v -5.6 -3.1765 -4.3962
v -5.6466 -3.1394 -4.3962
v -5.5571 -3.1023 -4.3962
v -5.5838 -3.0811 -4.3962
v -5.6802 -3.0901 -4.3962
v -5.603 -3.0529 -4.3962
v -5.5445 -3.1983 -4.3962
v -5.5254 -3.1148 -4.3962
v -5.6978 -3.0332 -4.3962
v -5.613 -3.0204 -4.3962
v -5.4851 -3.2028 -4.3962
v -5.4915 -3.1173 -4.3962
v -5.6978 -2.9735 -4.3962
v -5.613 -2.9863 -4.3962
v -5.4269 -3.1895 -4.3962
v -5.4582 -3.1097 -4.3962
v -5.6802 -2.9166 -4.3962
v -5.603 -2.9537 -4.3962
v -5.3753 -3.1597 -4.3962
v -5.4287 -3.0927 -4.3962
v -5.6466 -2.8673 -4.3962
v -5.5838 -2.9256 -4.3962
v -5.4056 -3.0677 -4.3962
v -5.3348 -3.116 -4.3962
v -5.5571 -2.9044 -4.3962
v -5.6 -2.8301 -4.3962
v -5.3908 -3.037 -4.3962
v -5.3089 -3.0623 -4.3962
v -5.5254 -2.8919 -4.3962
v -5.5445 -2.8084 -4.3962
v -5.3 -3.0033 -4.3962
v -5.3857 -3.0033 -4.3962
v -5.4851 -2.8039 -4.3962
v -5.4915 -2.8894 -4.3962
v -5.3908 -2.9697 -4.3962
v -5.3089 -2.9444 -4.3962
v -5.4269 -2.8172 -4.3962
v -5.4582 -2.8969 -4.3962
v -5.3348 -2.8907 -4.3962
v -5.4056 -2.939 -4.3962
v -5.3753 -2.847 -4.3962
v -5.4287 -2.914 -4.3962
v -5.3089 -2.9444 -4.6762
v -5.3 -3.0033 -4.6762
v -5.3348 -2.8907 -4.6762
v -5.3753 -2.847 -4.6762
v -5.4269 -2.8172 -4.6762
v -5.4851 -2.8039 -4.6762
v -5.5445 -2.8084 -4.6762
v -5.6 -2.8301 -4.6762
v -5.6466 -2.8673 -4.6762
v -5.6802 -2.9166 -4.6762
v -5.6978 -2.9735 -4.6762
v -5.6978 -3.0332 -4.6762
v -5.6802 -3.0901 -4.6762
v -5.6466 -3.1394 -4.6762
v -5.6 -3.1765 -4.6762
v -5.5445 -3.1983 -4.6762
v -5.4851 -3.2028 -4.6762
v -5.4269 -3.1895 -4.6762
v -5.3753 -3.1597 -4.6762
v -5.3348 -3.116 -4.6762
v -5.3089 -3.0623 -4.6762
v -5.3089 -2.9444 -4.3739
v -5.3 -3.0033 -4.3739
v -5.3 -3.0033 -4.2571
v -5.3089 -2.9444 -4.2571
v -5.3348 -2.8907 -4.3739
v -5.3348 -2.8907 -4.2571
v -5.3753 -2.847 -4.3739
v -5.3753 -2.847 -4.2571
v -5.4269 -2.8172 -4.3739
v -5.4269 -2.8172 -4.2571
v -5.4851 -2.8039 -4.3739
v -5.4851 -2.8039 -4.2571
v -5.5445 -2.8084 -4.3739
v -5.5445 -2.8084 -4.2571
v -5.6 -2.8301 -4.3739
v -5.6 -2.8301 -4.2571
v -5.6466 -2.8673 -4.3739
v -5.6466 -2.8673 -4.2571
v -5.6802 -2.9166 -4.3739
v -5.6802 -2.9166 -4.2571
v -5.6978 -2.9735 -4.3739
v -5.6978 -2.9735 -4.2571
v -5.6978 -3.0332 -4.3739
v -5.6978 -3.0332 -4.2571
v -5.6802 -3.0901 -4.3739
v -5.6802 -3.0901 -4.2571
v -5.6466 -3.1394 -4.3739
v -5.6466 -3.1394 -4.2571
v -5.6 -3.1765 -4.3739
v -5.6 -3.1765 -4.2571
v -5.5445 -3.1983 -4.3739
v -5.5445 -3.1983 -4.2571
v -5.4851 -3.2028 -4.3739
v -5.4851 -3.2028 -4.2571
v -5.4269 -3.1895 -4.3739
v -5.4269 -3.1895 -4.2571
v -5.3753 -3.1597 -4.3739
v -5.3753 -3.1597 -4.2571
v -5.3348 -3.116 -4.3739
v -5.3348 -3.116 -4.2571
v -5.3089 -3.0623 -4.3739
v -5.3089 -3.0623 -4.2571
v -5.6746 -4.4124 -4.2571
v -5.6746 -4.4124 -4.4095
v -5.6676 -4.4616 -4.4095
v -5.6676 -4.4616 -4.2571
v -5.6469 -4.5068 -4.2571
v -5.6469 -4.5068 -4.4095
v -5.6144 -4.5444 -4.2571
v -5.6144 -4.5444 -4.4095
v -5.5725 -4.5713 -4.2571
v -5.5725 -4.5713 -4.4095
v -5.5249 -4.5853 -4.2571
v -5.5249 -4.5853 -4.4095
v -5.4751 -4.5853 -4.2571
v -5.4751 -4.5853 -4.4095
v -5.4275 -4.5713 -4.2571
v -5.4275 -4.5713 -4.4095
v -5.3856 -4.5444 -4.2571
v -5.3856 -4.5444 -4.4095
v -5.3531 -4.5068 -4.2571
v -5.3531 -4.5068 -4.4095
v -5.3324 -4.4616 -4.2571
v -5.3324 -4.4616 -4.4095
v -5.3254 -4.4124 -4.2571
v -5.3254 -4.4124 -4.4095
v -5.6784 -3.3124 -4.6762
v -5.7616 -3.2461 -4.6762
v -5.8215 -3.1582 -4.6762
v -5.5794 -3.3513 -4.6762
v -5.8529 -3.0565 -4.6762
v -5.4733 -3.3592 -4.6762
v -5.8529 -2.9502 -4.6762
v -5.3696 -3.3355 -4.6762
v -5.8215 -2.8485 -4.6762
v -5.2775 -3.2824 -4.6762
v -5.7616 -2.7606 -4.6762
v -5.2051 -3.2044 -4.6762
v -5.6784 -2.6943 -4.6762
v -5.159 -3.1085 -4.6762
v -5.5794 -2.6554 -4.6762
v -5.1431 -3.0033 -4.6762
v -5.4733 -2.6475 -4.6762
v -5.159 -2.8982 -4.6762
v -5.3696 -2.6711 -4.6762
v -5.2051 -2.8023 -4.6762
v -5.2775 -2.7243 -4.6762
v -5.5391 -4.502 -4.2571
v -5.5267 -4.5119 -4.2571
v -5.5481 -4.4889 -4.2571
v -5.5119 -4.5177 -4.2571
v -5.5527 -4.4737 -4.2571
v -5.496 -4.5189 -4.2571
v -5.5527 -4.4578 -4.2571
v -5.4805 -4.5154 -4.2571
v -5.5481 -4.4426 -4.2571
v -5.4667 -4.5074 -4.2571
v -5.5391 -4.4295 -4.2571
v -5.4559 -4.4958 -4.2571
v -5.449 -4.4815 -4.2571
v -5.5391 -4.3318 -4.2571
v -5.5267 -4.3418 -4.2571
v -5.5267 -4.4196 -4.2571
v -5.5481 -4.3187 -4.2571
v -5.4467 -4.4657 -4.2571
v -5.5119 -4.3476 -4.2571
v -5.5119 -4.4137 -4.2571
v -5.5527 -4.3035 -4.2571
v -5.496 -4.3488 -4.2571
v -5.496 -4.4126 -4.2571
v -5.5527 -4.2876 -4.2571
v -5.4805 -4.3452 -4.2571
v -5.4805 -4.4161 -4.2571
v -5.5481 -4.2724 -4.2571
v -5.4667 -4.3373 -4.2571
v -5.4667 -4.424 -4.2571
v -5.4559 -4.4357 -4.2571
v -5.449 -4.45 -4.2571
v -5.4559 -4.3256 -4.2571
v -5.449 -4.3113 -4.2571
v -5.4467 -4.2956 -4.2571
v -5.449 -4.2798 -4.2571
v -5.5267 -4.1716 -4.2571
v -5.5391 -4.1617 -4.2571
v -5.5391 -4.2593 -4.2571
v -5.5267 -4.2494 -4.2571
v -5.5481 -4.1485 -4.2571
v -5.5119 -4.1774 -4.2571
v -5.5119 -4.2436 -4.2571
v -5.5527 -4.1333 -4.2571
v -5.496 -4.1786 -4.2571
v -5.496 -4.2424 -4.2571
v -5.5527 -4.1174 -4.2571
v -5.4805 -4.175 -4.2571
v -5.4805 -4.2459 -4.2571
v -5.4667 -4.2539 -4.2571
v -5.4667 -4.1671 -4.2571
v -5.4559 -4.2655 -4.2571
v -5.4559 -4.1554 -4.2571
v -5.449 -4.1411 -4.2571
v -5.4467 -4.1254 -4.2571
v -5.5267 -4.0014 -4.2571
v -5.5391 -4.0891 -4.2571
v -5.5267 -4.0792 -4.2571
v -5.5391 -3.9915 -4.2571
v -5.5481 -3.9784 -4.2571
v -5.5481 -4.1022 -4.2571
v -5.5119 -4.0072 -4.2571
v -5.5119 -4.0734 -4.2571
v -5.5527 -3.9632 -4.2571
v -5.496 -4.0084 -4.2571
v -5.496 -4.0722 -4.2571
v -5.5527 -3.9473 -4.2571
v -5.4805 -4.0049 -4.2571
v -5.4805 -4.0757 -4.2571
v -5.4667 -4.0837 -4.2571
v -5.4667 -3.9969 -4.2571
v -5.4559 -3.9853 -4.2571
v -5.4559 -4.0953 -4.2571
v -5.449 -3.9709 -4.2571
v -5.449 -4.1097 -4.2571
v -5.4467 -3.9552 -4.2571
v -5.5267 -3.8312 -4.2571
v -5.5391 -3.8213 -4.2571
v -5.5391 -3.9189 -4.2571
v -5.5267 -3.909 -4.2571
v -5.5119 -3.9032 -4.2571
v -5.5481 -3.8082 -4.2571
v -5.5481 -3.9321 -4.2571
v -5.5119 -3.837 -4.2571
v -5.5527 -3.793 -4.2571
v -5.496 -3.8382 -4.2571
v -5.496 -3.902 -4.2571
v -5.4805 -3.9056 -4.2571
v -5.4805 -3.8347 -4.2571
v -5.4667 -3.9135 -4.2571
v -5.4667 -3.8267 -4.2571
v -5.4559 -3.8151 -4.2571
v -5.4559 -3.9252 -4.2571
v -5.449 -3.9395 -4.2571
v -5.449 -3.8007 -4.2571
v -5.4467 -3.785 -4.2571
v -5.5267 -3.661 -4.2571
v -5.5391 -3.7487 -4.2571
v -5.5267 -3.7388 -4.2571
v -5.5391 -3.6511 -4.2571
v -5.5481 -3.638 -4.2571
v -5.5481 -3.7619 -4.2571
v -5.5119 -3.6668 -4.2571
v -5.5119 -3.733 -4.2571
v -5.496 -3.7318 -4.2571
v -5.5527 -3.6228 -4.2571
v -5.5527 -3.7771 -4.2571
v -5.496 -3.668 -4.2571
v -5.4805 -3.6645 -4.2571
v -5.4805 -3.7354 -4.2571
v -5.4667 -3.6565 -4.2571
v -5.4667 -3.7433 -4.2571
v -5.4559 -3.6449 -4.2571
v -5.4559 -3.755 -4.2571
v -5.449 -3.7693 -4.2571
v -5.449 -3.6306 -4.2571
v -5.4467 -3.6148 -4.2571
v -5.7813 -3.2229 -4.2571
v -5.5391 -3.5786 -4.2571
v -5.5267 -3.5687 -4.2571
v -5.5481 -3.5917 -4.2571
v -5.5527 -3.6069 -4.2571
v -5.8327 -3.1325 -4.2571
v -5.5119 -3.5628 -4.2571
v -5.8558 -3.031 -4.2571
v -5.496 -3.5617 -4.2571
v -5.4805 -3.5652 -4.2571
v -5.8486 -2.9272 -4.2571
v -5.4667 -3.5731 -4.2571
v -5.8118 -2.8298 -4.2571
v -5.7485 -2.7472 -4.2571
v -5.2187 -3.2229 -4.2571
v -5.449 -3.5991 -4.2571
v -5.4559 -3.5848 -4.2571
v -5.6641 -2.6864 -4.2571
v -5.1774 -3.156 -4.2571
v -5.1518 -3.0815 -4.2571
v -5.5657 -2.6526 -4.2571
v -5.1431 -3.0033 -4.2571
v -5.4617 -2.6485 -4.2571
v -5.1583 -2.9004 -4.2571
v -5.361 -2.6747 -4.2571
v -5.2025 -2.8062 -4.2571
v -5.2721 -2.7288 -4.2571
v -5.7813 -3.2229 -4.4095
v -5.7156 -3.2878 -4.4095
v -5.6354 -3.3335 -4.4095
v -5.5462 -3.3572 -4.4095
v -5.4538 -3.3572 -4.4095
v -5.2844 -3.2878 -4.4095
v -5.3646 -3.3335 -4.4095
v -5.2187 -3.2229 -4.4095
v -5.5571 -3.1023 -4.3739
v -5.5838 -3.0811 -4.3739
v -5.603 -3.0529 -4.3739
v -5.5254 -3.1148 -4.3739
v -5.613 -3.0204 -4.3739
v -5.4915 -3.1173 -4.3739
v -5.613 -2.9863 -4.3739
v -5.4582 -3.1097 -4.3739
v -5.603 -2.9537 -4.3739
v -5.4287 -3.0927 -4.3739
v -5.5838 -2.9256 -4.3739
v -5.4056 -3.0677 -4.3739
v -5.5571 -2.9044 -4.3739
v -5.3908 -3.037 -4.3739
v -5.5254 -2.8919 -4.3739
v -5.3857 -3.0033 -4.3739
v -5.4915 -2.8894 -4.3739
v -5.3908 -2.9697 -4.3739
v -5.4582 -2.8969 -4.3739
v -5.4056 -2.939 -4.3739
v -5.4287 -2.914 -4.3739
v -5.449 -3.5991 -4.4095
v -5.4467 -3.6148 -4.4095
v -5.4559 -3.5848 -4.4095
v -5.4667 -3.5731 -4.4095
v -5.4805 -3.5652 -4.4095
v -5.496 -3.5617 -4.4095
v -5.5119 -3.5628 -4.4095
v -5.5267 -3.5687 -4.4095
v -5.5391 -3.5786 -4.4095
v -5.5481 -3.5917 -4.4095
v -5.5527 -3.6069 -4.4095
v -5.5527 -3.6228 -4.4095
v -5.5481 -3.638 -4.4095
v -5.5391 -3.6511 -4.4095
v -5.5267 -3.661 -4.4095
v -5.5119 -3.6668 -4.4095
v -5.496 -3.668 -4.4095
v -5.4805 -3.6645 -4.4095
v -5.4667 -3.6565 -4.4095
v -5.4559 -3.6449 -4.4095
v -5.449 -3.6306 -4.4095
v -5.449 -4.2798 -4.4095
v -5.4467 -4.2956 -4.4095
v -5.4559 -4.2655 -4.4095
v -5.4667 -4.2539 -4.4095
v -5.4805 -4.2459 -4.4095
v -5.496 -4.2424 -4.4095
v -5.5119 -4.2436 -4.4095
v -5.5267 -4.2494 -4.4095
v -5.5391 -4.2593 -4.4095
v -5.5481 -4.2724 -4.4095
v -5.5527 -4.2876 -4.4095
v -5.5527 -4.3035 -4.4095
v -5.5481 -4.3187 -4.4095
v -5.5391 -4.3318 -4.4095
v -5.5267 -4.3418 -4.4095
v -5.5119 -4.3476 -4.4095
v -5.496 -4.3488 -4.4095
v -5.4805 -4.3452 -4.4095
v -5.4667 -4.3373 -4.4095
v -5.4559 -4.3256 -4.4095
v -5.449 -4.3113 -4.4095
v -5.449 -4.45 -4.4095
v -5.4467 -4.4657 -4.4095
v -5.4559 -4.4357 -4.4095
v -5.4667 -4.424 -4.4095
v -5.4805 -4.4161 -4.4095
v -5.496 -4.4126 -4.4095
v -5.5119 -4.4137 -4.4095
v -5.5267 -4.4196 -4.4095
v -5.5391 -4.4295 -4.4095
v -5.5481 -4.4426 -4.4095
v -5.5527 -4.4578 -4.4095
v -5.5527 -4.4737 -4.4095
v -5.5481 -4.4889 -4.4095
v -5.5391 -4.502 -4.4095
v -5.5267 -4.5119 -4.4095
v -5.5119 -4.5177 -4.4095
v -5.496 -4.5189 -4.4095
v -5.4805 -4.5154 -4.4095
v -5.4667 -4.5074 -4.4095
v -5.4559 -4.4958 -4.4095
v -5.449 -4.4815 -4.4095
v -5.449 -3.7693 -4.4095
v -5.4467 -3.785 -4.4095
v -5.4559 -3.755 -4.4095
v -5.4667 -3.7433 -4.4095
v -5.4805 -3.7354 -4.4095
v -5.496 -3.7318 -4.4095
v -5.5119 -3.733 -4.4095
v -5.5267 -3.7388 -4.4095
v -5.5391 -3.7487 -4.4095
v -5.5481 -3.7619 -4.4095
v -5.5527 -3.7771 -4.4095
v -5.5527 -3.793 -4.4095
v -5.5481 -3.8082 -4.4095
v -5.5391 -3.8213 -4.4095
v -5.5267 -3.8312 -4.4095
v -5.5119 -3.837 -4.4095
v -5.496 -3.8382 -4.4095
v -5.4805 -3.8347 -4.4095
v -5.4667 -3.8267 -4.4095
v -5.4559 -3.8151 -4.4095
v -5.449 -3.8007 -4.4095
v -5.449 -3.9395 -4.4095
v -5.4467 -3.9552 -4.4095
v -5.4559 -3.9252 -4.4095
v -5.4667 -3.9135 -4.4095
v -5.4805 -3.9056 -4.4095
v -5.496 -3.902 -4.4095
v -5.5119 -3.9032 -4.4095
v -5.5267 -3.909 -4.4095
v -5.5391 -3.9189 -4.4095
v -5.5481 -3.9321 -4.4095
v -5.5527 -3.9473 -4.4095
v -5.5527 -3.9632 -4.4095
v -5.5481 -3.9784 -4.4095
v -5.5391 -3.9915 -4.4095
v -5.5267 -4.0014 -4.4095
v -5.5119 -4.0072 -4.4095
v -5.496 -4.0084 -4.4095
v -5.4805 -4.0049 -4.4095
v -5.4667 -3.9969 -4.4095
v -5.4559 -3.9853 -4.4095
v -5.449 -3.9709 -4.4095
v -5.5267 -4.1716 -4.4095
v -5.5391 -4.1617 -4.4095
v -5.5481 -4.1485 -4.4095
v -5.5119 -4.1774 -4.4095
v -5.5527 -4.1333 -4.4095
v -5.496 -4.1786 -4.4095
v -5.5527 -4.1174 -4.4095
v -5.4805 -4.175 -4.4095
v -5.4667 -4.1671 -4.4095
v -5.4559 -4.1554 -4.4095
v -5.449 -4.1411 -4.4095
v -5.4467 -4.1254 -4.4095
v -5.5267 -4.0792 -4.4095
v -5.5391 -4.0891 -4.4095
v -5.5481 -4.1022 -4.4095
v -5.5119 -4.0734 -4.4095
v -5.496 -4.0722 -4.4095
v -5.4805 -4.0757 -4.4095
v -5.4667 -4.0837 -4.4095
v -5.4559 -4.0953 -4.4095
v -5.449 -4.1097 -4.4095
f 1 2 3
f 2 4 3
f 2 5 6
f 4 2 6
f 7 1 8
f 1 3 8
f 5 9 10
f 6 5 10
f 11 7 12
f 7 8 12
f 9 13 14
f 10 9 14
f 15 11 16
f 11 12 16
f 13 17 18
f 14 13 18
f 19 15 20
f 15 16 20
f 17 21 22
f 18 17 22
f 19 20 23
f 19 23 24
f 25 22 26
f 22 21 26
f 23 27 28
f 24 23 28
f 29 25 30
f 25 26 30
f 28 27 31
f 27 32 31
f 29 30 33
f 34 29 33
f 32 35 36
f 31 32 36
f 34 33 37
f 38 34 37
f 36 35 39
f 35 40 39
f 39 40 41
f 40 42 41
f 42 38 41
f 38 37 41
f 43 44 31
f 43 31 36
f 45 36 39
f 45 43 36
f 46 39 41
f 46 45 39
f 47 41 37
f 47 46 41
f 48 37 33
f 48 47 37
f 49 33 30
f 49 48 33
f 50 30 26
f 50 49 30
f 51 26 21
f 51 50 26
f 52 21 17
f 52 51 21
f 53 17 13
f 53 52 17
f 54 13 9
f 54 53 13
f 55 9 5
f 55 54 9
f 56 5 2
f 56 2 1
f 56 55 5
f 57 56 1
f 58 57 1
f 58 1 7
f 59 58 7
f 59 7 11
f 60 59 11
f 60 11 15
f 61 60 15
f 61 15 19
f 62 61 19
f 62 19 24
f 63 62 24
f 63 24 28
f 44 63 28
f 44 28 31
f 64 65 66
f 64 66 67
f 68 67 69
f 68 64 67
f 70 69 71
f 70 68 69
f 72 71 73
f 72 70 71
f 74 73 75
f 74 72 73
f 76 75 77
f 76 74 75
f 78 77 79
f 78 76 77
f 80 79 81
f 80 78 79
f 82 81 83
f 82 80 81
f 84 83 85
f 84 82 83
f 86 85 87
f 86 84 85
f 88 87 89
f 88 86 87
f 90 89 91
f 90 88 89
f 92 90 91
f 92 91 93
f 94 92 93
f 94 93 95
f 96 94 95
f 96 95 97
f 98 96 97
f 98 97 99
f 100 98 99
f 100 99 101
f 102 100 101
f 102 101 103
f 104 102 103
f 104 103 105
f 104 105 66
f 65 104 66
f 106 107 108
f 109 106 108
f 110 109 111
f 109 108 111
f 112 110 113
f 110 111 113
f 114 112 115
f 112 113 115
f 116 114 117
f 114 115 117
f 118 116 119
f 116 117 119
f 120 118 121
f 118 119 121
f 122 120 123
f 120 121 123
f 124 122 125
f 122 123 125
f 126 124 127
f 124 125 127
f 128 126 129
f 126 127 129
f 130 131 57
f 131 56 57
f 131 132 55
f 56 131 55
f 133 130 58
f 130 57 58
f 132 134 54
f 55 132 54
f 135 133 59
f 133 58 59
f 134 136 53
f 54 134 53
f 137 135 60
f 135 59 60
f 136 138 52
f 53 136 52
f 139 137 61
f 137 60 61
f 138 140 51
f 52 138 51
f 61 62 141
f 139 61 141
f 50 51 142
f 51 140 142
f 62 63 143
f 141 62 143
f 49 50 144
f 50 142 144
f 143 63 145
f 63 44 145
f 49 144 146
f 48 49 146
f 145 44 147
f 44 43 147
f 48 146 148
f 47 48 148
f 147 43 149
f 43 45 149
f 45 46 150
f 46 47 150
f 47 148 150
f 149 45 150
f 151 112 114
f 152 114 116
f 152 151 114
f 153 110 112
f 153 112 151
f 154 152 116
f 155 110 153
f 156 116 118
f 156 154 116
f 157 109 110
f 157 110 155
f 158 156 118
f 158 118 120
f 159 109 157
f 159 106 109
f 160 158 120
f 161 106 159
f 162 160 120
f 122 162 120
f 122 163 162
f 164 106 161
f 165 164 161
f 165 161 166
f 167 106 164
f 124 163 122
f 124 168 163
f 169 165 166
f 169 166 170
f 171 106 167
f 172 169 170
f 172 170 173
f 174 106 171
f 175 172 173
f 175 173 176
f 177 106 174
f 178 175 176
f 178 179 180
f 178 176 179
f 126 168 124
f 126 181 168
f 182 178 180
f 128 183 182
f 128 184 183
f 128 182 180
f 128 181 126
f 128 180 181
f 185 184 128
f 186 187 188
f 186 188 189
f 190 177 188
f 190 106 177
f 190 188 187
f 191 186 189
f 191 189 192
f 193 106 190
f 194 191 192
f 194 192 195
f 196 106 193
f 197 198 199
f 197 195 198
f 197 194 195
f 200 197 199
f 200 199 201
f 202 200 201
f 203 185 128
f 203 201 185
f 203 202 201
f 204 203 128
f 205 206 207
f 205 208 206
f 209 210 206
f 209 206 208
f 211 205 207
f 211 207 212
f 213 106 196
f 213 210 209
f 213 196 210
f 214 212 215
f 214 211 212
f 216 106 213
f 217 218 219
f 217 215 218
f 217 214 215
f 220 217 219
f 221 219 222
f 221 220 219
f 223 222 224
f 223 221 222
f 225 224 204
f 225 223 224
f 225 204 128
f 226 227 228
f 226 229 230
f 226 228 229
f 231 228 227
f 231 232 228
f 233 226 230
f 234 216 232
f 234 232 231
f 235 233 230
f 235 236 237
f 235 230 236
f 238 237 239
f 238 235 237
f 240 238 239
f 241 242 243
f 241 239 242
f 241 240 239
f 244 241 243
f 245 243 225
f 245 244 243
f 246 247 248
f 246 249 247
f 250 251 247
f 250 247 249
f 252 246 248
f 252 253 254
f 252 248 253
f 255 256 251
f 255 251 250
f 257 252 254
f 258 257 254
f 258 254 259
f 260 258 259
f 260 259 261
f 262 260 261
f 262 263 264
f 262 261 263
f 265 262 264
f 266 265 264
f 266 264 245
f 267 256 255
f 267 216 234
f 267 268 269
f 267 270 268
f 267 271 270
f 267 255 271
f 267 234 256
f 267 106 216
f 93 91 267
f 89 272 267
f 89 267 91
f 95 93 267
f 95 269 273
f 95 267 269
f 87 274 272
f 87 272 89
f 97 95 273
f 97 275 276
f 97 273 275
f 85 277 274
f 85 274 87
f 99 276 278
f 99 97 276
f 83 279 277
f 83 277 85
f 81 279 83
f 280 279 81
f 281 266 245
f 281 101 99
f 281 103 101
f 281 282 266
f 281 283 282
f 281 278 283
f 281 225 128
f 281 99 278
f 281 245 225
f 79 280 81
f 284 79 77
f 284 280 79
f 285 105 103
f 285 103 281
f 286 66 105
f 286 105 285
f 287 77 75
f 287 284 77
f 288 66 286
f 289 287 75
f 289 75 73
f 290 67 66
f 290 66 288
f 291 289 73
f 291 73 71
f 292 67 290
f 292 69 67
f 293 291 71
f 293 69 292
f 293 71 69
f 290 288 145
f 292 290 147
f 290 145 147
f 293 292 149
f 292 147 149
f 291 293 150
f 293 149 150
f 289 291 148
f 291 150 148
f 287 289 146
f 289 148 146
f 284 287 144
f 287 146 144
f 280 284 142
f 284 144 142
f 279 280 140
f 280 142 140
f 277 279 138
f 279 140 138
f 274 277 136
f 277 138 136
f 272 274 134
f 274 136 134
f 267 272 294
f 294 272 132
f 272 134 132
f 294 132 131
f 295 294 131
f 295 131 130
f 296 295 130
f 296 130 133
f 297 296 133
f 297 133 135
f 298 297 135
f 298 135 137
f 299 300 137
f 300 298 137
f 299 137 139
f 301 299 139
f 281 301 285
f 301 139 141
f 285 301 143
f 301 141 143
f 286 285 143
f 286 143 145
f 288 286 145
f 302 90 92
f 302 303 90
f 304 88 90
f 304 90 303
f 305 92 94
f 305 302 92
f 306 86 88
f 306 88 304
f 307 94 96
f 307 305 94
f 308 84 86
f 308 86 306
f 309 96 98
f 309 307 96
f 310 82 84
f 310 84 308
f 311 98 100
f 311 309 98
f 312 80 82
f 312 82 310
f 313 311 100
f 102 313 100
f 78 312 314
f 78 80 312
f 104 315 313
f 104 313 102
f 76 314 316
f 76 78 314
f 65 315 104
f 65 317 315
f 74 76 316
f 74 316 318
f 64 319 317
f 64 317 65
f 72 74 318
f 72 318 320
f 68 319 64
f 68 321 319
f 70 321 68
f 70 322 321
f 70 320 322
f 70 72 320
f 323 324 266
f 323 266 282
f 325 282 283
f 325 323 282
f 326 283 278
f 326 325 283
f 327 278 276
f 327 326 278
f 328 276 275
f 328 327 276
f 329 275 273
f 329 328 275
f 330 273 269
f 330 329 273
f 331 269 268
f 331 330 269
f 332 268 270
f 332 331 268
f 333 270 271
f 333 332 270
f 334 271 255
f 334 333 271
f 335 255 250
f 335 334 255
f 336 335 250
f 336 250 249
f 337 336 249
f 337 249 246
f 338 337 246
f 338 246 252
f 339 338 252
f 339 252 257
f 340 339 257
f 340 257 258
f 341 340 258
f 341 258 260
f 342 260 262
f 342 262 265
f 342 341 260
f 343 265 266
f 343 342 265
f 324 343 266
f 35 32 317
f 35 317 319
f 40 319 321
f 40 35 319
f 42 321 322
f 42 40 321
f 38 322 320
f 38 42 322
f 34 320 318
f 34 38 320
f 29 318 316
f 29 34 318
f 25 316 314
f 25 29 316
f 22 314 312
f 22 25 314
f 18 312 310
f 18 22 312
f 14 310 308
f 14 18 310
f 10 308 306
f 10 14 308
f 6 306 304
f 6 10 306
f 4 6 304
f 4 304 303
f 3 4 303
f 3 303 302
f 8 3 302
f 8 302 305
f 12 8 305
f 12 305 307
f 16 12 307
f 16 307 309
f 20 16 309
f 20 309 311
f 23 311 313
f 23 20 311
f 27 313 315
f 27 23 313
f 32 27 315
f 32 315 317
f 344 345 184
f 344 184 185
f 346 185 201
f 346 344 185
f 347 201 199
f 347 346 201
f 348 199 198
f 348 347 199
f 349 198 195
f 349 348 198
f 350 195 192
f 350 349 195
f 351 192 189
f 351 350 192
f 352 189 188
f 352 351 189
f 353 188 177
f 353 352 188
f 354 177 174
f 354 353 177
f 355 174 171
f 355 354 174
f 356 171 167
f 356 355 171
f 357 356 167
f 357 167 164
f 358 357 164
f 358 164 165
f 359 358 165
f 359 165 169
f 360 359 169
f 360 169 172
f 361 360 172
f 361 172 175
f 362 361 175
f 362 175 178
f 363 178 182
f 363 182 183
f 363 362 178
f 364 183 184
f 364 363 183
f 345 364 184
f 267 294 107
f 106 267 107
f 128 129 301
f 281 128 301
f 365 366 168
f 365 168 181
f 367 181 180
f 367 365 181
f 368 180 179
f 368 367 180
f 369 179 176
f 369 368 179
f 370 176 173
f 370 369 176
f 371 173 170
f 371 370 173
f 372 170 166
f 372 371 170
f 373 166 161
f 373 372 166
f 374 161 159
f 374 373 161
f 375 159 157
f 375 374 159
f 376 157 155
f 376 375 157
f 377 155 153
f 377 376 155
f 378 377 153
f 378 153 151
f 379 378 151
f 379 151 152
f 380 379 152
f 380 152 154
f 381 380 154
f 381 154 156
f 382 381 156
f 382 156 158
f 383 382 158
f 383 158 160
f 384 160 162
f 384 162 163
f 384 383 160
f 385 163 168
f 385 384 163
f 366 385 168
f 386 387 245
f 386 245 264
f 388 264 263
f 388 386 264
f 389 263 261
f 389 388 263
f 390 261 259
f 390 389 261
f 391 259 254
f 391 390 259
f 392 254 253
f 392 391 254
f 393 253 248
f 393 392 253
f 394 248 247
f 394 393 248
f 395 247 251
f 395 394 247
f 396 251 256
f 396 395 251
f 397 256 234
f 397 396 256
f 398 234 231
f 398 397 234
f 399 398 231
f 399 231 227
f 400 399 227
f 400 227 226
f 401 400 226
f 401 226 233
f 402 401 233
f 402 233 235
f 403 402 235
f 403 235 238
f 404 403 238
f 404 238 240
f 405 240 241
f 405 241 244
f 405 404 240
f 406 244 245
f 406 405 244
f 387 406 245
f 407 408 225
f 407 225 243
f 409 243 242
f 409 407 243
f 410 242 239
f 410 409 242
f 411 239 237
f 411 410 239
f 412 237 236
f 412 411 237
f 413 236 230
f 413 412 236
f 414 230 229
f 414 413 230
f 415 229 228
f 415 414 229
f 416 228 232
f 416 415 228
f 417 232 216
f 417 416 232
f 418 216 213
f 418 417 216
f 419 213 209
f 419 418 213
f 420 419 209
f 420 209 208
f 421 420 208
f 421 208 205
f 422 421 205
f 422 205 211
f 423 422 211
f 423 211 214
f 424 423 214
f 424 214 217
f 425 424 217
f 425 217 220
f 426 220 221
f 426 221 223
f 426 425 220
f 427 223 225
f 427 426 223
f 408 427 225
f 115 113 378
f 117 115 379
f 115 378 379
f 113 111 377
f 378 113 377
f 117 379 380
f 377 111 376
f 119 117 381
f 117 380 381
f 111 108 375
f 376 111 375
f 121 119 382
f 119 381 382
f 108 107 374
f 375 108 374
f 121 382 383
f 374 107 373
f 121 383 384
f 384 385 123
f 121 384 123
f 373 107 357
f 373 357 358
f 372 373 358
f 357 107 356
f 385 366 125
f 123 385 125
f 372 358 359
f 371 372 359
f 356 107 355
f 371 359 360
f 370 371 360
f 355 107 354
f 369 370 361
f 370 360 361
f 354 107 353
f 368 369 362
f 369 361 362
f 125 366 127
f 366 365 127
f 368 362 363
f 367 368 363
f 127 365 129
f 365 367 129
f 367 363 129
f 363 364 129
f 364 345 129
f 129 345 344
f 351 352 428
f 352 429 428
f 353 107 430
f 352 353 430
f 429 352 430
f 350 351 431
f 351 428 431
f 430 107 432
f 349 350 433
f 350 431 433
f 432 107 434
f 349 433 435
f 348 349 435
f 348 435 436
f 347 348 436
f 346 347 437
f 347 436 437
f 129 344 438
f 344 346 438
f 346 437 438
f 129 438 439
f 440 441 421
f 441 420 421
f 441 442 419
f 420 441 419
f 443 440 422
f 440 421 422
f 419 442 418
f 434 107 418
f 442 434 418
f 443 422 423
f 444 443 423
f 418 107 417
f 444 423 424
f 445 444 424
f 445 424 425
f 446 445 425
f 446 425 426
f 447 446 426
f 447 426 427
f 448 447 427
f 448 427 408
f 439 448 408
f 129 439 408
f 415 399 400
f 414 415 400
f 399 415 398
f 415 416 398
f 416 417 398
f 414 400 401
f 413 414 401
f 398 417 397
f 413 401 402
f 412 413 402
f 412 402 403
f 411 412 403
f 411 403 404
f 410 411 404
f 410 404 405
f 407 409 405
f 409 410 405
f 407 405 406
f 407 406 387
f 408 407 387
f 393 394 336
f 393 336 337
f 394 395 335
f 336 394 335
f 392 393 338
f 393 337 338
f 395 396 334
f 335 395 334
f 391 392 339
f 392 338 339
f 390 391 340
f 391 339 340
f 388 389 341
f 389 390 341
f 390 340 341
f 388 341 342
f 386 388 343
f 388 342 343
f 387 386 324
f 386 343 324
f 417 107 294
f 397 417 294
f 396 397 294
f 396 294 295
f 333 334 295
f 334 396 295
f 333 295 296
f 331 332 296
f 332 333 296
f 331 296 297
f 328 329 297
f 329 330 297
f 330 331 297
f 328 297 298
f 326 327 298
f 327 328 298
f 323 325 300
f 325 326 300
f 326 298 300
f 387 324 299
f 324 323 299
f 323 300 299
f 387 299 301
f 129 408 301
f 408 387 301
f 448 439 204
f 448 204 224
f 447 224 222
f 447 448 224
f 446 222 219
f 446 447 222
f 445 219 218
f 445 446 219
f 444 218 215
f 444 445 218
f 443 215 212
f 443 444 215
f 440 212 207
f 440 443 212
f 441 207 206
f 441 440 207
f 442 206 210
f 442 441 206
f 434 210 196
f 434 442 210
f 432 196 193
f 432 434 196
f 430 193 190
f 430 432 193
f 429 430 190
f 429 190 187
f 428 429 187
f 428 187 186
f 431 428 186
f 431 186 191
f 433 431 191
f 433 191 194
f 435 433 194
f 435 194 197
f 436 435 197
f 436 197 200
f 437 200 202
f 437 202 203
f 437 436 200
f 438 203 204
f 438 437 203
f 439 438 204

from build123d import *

# Parameters (mm, degrees)
SKETCH1_R           = 3.5687
SKETCH1_R_2         = 2
BOSS_EXTRUDE1_DEPTH = 4.191
SKETCH5_R           = 2
SKETCH5_R_2         = 1.143
BOSS_EXTRUDE2_DEPTH = 0.2226
BOSS_EXTRUDE3_START = -1.524
SKETCH6_R           = 0.5334
BOSS_EXTRUDE3_DEPTH = 1.524
SCALE1_SCALE        = 0.1


with BuildPart() as part:
    # Sketch1 → Boss-Extrude1 (new body)
    with BuildSketch(Plane.XY.offset(-7.032965862)):
        with Locations((-5.5, 0)):
            Circle(SKETCH1_R)
        with Locations((-5.5, 0)):
            Circle(SKETCH1_R_2, mode=Mode.SUBTRACT)
    extrude(amount=BOSS_EXTRUDE1_DEPTH)

    # Sketch5 → Boss-Extrude2 (add)
    with BuildSketch(Plane.XY.offset(-4.232965862)):
        with Locations((-5.5, 0)):
            Circle(SKETCH5_R)
        with Locations((-5.5, 0)):
            Circle(SKETCH5_R_2, mode=Mode.SUBTRACT)
    extrude(amount=BOSS_EXTRUDE2_DEPTH)

    # Sketch6 → Boss-Extrude3 (add)
    with BuildSketch(Plane.XY.offset(-2.841965862).offset(BOSS_EXTRUDE3_START)):
        with BuildLine():
            Line((-3.75375, -14.09065), (-2.68695, -2.195989387))
            ThreePointArc((-2.68695, -2.195989387), (-5.5, -3.5687), (-8.31305, -2.195989387))
            Line((-8.31305, -2.195989387), (-7.24625, -14.09065))
            ThreePointArc((-7.24625, -14.09065), (-5.5, -15.8369), (-3.75375, -14.09065))
        make_face()
        with Locations((-5.5, -12.92225)):
            Circle(SKETCH6_R, mode=Mode.SUBTRACT)
        with Locations((-5.5, -14.62405)):
            Circle(SKETCH6_R, mode=Mode.SUBTRACT)
        with Locations((-5.5, -11.22045)):
            Circle(SKETCH6_R, mode=Mode.SUBTRACT)
        with Locations((-5.5, -9.51865)):
            Circle(SKETCH6_R, mode=Mode.SUBTRACT)
        with Locations((-5.5, -7.81685)):
            Circle(SKETCH6_R, mode=Mode.SUBTRACT)
        with Locations((-5.5, -6.11505)):
            Circle(SKETCH6_R, mode=Mode.SUBTRACT)
    extrude(amount=BOSS_EXTRUDE3_DEPTH)


with BuildPart() as part_1:
    # Scale1: scaled about (-5.5, -3.337046633, -4.414341791)
    add(part.part.scale(SCALE1_SCALE).moved(Location((-4.95, -3.00334197, -3.972907612))))


solid = part_1.part
